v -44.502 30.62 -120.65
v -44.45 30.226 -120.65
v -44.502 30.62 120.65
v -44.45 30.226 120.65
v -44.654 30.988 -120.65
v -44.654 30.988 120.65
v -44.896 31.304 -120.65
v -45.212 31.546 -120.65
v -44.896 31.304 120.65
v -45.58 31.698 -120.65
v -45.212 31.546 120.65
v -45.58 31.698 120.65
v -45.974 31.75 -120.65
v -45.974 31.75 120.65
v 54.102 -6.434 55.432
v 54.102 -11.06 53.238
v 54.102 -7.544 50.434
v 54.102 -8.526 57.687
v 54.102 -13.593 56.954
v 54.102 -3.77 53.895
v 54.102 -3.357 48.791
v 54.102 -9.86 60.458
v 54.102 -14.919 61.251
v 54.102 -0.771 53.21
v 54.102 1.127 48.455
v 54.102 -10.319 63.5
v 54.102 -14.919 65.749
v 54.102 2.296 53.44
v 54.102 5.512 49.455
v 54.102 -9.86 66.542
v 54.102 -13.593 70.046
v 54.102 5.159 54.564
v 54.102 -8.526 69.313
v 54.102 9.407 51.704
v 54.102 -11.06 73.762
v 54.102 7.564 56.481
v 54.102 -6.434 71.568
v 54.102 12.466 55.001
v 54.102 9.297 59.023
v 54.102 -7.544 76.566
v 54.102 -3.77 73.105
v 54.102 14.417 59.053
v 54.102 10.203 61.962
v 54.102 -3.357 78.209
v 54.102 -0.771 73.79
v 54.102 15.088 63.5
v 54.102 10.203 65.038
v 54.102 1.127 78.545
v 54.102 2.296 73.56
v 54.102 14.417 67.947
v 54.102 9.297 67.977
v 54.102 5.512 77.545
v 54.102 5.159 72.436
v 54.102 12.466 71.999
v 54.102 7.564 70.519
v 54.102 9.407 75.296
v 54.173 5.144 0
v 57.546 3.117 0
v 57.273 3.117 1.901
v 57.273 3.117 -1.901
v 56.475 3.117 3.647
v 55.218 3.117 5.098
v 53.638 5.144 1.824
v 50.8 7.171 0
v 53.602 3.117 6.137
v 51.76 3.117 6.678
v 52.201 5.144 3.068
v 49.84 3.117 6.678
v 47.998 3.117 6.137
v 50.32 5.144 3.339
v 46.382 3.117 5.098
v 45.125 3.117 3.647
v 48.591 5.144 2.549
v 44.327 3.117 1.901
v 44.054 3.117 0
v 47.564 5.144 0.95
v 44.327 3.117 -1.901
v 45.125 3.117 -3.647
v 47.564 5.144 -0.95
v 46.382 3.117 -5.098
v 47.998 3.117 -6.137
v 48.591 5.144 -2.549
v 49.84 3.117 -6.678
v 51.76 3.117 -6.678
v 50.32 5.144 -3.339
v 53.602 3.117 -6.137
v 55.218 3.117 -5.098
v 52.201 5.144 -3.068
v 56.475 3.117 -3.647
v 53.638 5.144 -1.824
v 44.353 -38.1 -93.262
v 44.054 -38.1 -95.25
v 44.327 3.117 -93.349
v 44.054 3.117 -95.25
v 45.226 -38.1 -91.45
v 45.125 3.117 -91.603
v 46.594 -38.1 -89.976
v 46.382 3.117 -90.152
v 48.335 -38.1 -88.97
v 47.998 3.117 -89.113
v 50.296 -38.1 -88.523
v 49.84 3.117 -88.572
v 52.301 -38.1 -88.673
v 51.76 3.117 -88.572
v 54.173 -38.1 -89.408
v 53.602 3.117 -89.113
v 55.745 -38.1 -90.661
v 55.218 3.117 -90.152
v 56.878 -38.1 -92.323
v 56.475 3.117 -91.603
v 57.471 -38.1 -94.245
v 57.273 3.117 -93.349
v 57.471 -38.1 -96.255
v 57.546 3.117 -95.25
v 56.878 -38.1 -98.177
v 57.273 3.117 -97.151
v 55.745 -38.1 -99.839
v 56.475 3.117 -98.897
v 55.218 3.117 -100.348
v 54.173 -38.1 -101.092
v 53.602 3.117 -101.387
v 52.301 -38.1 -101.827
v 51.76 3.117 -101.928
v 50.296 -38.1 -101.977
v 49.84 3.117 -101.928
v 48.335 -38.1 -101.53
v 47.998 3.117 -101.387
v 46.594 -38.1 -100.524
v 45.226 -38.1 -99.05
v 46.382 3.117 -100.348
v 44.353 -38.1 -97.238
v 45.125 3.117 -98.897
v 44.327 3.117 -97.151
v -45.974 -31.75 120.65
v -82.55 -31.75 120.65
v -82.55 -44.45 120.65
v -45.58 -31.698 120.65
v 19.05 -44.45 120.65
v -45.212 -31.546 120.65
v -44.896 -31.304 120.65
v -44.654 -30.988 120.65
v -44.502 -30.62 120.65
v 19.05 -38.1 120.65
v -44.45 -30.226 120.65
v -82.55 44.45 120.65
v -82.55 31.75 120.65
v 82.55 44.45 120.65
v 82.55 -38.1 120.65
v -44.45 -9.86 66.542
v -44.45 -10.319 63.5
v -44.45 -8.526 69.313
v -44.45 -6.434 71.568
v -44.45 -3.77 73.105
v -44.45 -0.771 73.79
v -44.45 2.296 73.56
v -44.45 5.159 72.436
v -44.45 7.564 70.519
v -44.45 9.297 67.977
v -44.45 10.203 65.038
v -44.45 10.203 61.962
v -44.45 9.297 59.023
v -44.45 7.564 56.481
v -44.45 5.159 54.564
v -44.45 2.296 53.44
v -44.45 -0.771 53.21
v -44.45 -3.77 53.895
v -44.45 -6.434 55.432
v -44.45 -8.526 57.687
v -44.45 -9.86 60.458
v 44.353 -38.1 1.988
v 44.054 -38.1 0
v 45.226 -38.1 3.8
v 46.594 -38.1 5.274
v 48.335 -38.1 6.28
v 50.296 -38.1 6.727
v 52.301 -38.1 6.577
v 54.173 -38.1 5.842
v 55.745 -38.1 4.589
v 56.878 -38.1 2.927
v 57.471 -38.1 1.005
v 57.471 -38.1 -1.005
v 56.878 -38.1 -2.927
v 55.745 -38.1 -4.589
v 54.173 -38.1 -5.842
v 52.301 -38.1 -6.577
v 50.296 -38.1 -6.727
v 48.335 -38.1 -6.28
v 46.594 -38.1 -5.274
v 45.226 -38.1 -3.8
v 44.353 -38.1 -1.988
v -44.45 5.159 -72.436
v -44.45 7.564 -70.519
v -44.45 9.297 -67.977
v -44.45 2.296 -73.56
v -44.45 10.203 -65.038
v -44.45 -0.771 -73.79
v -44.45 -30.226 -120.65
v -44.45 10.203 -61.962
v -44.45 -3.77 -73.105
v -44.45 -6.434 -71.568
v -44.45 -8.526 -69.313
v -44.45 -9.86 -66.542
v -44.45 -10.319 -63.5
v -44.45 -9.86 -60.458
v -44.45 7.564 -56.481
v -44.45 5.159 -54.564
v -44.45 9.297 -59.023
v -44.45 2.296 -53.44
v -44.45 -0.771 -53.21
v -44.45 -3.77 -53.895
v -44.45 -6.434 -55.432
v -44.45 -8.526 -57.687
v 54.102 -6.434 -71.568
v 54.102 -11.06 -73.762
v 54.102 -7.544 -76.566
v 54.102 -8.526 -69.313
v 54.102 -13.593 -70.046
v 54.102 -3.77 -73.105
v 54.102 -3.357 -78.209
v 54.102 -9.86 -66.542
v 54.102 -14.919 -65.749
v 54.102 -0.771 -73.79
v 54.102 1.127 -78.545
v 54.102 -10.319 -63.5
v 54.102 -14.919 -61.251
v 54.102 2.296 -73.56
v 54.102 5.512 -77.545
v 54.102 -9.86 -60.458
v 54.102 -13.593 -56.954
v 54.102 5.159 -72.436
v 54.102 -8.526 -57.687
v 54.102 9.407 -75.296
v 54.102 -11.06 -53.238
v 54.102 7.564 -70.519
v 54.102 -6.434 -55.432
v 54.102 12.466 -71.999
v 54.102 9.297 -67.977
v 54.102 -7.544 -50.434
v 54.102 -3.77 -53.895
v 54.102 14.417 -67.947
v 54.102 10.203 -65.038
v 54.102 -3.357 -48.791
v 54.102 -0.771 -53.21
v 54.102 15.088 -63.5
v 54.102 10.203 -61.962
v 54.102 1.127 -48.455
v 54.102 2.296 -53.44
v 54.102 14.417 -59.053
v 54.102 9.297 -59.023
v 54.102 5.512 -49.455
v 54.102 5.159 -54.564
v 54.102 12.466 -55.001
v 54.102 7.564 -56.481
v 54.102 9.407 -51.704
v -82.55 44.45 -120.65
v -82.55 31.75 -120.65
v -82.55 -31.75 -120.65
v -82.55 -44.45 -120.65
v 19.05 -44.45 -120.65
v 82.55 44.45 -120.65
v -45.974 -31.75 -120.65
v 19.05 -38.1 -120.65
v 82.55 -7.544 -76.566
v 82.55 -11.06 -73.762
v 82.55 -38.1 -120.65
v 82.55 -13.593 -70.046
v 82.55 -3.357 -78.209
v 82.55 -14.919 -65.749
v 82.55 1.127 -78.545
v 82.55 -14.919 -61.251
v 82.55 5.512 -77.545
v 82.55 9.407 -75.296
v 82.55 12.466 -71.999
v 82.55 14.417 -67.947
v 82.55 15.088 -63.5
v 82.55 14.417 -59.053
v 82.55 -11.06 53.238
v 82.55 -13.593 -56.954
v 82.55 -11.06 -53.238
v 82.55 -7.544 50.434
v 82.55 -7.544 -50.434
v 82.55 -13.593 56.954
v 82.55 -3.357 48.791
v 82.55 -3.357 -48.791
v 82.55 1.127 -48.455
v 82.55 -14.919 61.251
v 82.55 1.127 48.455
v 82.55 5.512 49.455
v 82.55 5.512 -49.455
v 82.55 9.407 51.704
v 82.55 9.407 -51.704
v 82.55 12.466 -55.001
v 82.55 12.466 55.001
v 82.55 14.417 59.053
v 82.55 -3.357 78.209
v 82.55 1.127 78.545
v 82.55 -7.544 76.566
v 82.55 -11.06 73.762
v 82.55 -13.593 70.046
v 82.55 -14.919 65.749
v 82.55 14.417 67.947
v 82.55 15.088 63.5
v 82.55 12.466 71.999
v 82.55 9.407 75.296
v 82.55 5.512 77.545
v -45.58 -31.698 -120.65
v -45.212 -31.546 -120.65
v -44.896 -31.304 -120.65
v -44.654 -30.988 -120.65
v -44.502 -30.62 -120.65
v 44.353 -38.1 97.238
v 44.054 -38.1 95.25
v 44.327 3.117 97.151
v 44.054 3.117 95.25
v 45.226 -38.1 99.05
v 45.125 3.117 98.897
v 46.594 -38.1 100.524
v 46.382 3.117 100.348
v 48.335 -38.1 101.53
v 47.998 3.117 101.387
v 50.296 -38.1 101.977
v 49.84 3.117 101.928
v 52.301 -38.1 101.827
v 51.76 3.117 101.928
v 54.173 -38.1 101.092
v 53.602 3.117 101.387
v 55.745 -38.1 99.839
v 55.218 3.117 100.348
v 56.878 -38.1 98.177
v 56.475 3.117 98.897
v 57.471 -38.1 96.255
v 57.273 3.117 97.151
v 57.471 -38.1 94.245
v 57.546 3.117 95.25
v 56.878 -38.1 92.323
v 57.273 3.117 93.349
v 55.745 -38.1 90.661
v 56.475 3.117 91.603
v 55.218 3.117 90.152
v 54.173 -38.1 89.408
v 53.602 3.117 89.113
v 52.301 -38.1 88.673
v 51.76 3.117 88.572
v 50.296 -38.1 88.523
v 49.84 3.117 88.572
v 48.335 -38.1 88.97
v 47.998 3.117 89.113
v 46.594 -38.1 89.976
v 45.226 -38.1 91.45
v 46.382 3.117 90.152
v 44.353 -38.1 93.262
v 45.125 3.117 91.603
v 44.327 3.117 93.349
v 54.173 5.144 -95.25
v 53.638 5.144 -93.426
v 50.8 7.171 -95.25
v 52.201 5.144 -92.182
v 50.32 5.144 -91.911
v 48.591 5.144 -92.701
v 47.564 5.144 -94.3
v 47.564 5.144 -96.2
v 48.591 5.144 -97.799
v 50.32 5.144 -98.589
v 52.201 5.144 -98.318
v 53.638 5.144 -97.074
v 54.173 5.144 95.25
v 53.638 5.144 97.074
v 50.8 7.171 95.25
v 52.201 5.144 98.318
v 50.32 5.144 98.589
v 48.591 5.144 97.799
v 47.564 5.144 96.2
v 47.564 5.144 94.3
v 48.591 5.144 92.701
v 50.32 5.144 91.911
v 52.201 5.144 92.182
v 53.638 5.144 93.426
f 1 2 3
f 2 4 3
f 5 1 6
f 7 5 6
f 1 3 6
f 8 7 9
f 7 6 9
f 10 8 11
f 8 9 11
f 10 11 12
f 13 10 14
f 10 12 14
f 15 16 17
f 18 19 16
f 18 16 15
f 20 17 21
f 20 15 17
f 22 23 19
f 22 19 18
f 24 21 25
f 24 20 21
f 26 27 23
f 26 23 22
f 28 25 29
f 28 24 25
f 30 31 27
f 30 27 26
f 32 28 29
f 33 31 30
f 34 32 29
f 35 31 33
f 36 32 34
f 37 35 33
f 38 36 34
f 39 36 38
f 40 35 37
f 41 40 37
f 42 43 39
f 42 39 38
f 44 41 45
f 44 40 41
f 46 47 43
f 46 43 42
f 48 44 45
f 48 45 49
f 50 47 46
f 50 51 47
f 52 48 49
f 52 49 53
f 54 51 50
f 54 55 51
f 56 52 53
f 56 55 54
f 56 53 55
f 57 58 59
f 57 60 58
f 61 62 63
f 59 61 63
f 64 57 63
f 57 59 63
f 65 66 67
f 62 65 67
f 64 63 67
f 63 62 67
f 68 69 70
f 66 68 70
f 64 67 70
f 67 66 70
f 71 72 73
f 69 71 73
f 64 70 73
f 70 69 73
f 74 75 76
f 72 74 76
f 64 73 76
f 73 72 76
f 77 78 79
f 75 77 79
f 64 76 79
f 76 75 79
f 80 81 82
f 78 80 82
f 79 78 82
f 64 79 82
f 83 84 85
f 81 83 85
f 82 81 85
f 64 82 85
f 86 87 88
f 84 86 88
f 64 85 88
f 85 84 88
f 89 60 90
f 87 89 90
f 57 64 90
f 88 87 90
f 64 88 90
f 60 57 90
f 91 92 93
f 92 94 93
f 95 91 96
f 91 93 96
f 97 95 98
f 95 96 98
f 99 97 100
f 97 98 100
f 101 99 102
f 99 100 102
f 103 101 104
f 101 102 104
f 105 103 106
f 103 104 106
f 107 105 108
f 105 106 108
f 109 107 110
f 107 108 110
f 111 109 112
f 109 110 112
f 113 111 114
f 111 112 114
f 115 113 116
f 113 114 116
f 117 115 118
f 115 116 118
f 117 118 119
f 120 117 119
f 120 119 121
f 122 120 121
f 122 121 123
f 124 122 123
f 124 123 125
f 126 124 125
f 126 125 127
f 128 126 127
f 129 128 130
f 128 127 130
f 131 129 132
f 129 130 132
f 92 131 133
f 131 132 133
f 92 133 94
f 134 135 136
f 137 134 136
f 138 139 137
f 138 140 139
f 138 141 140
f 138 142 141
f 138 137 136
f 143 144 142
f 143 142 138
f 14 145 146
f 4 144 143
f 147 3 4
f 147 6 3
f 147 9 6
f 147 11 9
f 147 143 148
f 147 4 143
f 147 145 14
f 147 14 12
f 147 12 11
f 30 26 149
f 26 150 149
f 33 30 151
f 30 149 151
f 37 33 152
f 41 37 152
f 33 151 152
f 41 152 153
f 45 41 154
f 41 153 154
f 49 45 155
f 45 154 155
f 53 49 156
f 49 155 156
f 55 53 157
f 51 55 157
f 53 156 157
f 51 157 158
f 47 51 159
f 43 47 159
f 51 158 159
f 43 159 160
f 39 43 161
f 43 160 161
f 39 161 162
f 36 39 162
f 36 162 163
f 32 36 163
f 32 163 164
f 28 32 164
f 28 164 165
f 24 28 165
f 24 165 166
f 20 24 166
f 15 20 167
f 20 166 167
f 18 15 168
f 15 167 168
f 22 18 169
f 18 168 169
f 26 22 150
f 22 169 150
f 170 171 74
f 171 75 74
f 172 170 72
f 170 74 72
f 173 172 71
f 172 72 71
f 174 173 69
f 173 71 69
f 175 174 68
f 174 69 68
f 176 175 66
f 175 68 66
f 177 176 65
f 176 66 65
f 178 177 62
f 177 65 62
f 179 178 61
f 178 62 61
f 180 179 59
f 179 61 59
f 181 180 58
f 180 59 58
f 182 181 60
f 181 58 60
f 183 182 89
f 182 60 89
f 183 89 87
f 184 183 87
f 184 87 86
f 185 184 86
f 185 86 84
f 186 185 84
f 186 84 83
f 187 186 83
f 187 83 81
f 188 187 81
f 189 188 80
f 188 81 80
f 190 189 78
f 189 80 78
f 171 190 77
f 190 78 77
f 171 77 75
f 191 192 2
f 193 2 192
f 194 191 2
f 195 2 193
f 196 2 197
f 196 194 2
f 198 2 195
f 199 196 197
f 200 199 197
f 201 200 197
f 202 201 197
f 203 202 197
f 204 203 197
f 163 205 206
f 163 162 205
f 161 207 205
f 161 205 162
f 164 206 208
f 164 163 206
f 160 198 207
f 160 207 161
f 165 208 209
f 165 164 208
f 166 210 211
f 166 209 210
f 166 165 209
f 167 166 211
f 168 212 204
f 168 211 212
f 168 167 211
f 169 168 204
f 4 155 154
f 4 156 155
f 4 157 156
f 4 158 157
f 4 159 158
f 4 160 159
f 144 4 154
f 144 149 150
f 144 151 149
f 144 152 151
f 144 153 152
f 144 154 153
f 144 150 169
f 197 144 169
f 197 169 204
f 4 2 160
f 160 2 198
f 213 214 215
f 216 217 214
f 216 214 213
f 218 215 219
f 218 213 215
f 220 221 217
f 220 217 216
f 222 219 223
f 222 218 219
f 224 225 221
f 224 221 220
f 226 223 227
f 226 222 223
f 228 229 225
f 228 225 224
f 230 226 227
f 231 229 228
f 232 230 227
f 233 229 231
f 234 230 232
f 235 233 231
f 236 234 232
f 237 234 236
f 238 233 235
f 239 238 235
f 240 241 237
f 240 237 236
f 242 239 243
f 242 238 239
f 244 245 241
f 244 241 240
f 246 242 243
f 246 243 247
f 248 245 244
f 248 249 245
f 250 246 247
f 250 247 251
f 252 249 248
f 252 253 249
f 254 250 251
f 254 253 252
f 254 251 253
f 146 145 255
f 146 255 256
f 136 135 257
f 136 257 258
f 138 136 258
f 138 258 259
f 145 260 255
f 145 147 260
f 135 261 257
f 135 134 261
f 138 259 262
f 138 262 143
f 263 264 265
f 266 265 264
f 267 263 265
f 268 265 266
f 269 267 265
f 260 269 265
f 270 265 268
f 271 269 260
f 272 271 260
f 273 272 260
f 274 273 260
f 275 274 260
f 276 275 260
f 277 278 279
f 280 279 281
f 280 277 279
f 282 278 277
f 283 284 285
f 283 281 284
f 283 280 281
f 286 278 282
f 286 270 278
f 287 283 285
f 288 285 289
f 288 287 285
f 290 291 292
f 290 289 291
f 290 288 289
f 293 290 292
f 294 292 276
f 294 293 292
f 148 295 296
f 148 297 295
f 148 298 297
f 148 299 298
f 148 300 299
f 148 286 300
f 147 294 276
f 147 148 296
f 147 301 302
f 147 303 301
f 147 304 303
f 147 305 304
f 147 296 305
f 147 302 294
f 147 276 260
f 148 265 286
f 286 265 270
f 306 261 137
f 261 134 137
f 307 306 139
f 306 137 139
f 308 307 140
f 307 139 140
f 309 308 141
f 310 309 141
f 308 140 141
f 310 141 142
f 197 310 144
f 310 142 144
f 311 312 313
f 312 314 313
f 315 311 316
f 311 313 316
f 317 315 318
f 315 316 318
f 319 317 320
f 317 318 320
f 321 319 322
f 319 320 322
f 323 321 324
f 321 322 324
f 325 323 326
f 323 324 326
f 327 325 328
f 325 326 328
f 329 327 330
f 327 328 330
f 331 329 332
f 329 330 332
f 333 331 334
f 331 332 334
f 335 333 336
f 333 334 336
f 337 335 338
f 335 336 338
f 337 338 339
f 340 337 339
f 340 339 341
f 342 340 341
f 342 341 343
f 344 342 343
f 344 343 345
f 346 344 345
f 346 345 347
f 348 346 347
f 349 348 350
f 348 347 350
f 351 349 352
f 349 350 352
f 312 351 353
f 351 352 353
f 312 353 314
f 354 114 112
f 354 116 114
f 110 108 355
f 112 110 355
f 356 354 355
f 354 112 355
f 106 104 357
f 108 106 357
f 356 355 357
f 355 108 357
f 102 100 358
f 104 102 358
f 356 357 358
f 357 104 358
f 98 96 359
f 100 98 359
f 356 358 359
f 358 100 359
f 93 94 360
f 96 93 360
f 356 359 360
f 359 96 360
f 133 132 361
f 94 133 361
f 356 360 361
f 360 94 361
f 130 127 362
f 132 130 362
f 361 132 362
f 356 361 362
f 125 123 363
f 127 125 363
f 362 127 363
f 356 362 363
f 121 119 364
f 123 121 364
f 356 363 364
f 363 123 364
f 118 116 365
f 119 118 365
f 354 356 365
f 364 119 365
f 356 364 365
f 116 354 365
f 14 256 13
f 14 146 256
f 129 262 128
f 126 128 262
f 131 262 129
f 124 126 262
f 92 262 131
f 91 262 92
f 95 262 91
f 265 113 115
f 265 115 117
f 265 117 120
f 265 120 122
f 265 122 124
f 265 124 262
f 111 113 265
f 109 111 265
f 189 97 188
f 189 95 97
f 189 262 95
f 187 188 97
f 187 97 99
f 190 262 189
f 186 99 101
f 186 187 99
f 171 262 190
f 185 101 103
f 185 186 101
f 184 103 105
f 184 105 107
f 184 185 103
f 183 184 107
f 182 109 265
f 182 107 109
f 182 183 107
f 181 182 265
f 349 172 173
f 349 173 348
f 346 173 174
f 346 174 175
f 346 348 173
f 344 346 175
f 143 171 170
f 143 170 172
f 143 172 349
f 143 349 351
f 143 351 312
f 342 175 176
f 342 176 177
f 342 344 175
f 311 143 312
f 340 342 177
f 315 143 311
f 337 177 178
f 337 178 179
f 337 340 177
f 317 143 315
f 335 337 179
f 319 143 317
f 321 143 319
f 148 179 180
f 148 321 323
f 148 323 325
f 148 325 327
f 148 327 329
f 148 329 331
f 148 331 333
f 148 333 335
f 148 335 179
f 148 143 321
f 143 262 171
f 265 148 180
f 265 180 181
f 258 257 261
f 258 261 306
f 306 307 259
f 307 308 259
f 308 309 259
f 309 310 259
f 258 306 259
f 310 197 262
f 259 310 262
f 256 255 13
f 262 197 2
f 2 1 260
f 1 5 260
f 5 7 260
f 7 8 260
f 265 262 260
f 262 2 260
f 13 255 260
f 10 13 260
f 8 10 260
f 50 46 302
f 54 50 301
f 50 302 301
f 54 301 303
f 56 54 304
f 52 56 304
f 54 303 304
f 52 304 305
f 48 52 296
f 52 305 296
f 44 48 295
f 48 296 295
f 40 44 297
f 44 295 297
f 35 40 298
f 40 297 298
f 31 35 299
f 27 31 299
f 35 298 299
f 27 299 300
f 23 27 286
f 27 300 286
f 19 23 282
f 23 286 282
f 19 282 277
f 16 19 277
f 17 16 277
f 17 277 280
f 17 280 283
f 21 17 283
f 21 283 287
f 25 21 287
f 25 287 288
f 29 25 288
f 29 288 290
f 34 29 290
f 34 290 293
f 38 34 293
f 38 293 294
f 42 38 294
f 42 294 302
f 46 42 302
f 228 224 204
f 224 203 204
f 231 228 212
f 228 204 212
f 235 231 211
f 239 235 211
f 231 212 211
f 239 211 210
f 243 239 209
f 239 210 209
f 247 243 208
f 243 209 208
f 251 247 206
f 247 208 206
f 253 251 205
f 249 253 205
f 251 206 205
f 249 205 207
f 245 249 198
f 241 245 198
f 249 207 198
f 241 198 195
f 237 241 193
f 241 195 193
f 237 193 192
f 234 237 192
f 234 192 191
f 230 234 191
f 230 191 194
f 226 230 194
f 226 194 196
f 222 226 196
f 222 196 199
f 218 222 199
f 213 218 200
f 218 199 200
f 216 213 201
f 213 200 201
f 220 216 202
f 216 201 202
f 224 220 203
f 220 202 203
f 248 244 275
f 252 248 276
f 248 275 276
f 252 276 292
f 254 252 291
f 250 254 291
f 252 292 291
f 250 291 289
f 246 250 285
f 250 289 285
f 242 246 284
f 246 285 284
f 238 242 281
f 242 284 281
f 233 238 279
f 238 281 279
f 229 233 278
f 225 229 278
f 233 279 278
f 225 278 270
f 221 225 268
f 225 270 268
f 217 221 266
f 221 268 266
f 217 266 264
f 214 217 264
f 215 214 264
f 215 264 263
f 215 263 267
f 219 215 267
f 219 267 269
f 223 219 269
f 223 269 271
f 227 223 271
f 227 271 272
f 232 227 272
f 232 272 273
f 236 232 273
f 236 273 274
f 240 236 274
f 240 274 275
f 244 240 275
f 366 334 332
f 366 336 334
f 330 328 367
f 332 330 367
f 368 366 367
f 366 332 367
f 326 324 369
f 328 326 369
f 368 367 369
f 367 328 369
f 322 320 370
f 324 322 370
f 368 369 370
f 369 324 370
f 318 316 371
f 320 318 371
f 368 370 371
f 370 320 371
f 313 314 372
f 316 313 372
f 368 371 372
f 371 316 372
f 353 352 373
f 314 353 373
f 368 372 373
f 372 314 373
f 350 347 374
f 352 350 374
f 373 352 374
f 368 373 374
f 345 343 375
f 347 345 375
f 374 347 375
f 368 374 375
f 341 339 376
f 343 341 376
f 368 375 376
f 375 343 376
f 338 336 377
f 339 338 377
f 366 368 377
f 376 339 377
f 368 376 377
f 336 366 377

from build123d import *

# Parameters (mm, degrees)
F1_DEPTH       = 120.65
F2_R           = 1.524
F4_D           = 20.6375
F4_CBORE_D     = 30.1752
F4_CBORE_DEPTH = 28.448
F5_W           = 63.5
F5_H           = 241.3
F6_DEPTH       = 6.35
F8_D           = 13.49248
F8_DEPTH       = 41.2172727273
F8_TIP         = 4.0535499425


# Not quite as in the source:
# - a length typed as a fraction of an inch, garbled in the dataset ("3 / 203.2 mm" for 3/8 in), is restored


with BuildPart() as f1:
    # F0 (on Top) → F1 (new body, symmetric)
    with BuildSketch(Plane.XY):
        Polygon((82.55, 44.45), (-82.55, 44.45), (-82.55, 31.75), (-44.45, 31.75), (-44.45, -31.75), (-82.55, -31.75), (-82.55, -44.45), (82.55, -44.45), align=None)
    extrude(amount=F1_DEPTH, both=True)

    # F2
    f2_edges = [f1.edges().sort_by_distance(p)[0] for p in [
        (-44.45, 31.75, 0),
        (-44.45, -31.75, 0),
    ]]
    fillet(f2_edges, radius=F2_R)

    # F4 (through all)
    with Locations(Plane.YZ.offset(82.55)):
        with Locations((0, 63.5), (0, -63.5)):
            CounterBoreHole(F4_D / 2, F4_CBORE_D / 2, F4_CBORE_DEPTH)

    # F5 (on face) → F6 (cut)
    with BuildSketch(Plane.XZ.offset(44.45)):
        with Locations((50.8, 0)):
            Rectangle(F5_W, F5_H)
    extrude(amount=-F6_DEPTH, mode=Mode.SUBTRACT)

    # F8
    with Locations(Plane.XZ.offset(38.1)):
        with Locations((50.8, 95.25), (50.8, 0), (50.8, -95.25)):
            Hole(F8_D / 2, depth=F8_DEPTH)
            with Locations((0, 0, -(F8_DEPTH + F8_TIP / 2))):  # 118° drill point
                Cone(0, F8_D / 2, F8_TIP, mode=Mode.SUBTRACT)


solid = f1.part
